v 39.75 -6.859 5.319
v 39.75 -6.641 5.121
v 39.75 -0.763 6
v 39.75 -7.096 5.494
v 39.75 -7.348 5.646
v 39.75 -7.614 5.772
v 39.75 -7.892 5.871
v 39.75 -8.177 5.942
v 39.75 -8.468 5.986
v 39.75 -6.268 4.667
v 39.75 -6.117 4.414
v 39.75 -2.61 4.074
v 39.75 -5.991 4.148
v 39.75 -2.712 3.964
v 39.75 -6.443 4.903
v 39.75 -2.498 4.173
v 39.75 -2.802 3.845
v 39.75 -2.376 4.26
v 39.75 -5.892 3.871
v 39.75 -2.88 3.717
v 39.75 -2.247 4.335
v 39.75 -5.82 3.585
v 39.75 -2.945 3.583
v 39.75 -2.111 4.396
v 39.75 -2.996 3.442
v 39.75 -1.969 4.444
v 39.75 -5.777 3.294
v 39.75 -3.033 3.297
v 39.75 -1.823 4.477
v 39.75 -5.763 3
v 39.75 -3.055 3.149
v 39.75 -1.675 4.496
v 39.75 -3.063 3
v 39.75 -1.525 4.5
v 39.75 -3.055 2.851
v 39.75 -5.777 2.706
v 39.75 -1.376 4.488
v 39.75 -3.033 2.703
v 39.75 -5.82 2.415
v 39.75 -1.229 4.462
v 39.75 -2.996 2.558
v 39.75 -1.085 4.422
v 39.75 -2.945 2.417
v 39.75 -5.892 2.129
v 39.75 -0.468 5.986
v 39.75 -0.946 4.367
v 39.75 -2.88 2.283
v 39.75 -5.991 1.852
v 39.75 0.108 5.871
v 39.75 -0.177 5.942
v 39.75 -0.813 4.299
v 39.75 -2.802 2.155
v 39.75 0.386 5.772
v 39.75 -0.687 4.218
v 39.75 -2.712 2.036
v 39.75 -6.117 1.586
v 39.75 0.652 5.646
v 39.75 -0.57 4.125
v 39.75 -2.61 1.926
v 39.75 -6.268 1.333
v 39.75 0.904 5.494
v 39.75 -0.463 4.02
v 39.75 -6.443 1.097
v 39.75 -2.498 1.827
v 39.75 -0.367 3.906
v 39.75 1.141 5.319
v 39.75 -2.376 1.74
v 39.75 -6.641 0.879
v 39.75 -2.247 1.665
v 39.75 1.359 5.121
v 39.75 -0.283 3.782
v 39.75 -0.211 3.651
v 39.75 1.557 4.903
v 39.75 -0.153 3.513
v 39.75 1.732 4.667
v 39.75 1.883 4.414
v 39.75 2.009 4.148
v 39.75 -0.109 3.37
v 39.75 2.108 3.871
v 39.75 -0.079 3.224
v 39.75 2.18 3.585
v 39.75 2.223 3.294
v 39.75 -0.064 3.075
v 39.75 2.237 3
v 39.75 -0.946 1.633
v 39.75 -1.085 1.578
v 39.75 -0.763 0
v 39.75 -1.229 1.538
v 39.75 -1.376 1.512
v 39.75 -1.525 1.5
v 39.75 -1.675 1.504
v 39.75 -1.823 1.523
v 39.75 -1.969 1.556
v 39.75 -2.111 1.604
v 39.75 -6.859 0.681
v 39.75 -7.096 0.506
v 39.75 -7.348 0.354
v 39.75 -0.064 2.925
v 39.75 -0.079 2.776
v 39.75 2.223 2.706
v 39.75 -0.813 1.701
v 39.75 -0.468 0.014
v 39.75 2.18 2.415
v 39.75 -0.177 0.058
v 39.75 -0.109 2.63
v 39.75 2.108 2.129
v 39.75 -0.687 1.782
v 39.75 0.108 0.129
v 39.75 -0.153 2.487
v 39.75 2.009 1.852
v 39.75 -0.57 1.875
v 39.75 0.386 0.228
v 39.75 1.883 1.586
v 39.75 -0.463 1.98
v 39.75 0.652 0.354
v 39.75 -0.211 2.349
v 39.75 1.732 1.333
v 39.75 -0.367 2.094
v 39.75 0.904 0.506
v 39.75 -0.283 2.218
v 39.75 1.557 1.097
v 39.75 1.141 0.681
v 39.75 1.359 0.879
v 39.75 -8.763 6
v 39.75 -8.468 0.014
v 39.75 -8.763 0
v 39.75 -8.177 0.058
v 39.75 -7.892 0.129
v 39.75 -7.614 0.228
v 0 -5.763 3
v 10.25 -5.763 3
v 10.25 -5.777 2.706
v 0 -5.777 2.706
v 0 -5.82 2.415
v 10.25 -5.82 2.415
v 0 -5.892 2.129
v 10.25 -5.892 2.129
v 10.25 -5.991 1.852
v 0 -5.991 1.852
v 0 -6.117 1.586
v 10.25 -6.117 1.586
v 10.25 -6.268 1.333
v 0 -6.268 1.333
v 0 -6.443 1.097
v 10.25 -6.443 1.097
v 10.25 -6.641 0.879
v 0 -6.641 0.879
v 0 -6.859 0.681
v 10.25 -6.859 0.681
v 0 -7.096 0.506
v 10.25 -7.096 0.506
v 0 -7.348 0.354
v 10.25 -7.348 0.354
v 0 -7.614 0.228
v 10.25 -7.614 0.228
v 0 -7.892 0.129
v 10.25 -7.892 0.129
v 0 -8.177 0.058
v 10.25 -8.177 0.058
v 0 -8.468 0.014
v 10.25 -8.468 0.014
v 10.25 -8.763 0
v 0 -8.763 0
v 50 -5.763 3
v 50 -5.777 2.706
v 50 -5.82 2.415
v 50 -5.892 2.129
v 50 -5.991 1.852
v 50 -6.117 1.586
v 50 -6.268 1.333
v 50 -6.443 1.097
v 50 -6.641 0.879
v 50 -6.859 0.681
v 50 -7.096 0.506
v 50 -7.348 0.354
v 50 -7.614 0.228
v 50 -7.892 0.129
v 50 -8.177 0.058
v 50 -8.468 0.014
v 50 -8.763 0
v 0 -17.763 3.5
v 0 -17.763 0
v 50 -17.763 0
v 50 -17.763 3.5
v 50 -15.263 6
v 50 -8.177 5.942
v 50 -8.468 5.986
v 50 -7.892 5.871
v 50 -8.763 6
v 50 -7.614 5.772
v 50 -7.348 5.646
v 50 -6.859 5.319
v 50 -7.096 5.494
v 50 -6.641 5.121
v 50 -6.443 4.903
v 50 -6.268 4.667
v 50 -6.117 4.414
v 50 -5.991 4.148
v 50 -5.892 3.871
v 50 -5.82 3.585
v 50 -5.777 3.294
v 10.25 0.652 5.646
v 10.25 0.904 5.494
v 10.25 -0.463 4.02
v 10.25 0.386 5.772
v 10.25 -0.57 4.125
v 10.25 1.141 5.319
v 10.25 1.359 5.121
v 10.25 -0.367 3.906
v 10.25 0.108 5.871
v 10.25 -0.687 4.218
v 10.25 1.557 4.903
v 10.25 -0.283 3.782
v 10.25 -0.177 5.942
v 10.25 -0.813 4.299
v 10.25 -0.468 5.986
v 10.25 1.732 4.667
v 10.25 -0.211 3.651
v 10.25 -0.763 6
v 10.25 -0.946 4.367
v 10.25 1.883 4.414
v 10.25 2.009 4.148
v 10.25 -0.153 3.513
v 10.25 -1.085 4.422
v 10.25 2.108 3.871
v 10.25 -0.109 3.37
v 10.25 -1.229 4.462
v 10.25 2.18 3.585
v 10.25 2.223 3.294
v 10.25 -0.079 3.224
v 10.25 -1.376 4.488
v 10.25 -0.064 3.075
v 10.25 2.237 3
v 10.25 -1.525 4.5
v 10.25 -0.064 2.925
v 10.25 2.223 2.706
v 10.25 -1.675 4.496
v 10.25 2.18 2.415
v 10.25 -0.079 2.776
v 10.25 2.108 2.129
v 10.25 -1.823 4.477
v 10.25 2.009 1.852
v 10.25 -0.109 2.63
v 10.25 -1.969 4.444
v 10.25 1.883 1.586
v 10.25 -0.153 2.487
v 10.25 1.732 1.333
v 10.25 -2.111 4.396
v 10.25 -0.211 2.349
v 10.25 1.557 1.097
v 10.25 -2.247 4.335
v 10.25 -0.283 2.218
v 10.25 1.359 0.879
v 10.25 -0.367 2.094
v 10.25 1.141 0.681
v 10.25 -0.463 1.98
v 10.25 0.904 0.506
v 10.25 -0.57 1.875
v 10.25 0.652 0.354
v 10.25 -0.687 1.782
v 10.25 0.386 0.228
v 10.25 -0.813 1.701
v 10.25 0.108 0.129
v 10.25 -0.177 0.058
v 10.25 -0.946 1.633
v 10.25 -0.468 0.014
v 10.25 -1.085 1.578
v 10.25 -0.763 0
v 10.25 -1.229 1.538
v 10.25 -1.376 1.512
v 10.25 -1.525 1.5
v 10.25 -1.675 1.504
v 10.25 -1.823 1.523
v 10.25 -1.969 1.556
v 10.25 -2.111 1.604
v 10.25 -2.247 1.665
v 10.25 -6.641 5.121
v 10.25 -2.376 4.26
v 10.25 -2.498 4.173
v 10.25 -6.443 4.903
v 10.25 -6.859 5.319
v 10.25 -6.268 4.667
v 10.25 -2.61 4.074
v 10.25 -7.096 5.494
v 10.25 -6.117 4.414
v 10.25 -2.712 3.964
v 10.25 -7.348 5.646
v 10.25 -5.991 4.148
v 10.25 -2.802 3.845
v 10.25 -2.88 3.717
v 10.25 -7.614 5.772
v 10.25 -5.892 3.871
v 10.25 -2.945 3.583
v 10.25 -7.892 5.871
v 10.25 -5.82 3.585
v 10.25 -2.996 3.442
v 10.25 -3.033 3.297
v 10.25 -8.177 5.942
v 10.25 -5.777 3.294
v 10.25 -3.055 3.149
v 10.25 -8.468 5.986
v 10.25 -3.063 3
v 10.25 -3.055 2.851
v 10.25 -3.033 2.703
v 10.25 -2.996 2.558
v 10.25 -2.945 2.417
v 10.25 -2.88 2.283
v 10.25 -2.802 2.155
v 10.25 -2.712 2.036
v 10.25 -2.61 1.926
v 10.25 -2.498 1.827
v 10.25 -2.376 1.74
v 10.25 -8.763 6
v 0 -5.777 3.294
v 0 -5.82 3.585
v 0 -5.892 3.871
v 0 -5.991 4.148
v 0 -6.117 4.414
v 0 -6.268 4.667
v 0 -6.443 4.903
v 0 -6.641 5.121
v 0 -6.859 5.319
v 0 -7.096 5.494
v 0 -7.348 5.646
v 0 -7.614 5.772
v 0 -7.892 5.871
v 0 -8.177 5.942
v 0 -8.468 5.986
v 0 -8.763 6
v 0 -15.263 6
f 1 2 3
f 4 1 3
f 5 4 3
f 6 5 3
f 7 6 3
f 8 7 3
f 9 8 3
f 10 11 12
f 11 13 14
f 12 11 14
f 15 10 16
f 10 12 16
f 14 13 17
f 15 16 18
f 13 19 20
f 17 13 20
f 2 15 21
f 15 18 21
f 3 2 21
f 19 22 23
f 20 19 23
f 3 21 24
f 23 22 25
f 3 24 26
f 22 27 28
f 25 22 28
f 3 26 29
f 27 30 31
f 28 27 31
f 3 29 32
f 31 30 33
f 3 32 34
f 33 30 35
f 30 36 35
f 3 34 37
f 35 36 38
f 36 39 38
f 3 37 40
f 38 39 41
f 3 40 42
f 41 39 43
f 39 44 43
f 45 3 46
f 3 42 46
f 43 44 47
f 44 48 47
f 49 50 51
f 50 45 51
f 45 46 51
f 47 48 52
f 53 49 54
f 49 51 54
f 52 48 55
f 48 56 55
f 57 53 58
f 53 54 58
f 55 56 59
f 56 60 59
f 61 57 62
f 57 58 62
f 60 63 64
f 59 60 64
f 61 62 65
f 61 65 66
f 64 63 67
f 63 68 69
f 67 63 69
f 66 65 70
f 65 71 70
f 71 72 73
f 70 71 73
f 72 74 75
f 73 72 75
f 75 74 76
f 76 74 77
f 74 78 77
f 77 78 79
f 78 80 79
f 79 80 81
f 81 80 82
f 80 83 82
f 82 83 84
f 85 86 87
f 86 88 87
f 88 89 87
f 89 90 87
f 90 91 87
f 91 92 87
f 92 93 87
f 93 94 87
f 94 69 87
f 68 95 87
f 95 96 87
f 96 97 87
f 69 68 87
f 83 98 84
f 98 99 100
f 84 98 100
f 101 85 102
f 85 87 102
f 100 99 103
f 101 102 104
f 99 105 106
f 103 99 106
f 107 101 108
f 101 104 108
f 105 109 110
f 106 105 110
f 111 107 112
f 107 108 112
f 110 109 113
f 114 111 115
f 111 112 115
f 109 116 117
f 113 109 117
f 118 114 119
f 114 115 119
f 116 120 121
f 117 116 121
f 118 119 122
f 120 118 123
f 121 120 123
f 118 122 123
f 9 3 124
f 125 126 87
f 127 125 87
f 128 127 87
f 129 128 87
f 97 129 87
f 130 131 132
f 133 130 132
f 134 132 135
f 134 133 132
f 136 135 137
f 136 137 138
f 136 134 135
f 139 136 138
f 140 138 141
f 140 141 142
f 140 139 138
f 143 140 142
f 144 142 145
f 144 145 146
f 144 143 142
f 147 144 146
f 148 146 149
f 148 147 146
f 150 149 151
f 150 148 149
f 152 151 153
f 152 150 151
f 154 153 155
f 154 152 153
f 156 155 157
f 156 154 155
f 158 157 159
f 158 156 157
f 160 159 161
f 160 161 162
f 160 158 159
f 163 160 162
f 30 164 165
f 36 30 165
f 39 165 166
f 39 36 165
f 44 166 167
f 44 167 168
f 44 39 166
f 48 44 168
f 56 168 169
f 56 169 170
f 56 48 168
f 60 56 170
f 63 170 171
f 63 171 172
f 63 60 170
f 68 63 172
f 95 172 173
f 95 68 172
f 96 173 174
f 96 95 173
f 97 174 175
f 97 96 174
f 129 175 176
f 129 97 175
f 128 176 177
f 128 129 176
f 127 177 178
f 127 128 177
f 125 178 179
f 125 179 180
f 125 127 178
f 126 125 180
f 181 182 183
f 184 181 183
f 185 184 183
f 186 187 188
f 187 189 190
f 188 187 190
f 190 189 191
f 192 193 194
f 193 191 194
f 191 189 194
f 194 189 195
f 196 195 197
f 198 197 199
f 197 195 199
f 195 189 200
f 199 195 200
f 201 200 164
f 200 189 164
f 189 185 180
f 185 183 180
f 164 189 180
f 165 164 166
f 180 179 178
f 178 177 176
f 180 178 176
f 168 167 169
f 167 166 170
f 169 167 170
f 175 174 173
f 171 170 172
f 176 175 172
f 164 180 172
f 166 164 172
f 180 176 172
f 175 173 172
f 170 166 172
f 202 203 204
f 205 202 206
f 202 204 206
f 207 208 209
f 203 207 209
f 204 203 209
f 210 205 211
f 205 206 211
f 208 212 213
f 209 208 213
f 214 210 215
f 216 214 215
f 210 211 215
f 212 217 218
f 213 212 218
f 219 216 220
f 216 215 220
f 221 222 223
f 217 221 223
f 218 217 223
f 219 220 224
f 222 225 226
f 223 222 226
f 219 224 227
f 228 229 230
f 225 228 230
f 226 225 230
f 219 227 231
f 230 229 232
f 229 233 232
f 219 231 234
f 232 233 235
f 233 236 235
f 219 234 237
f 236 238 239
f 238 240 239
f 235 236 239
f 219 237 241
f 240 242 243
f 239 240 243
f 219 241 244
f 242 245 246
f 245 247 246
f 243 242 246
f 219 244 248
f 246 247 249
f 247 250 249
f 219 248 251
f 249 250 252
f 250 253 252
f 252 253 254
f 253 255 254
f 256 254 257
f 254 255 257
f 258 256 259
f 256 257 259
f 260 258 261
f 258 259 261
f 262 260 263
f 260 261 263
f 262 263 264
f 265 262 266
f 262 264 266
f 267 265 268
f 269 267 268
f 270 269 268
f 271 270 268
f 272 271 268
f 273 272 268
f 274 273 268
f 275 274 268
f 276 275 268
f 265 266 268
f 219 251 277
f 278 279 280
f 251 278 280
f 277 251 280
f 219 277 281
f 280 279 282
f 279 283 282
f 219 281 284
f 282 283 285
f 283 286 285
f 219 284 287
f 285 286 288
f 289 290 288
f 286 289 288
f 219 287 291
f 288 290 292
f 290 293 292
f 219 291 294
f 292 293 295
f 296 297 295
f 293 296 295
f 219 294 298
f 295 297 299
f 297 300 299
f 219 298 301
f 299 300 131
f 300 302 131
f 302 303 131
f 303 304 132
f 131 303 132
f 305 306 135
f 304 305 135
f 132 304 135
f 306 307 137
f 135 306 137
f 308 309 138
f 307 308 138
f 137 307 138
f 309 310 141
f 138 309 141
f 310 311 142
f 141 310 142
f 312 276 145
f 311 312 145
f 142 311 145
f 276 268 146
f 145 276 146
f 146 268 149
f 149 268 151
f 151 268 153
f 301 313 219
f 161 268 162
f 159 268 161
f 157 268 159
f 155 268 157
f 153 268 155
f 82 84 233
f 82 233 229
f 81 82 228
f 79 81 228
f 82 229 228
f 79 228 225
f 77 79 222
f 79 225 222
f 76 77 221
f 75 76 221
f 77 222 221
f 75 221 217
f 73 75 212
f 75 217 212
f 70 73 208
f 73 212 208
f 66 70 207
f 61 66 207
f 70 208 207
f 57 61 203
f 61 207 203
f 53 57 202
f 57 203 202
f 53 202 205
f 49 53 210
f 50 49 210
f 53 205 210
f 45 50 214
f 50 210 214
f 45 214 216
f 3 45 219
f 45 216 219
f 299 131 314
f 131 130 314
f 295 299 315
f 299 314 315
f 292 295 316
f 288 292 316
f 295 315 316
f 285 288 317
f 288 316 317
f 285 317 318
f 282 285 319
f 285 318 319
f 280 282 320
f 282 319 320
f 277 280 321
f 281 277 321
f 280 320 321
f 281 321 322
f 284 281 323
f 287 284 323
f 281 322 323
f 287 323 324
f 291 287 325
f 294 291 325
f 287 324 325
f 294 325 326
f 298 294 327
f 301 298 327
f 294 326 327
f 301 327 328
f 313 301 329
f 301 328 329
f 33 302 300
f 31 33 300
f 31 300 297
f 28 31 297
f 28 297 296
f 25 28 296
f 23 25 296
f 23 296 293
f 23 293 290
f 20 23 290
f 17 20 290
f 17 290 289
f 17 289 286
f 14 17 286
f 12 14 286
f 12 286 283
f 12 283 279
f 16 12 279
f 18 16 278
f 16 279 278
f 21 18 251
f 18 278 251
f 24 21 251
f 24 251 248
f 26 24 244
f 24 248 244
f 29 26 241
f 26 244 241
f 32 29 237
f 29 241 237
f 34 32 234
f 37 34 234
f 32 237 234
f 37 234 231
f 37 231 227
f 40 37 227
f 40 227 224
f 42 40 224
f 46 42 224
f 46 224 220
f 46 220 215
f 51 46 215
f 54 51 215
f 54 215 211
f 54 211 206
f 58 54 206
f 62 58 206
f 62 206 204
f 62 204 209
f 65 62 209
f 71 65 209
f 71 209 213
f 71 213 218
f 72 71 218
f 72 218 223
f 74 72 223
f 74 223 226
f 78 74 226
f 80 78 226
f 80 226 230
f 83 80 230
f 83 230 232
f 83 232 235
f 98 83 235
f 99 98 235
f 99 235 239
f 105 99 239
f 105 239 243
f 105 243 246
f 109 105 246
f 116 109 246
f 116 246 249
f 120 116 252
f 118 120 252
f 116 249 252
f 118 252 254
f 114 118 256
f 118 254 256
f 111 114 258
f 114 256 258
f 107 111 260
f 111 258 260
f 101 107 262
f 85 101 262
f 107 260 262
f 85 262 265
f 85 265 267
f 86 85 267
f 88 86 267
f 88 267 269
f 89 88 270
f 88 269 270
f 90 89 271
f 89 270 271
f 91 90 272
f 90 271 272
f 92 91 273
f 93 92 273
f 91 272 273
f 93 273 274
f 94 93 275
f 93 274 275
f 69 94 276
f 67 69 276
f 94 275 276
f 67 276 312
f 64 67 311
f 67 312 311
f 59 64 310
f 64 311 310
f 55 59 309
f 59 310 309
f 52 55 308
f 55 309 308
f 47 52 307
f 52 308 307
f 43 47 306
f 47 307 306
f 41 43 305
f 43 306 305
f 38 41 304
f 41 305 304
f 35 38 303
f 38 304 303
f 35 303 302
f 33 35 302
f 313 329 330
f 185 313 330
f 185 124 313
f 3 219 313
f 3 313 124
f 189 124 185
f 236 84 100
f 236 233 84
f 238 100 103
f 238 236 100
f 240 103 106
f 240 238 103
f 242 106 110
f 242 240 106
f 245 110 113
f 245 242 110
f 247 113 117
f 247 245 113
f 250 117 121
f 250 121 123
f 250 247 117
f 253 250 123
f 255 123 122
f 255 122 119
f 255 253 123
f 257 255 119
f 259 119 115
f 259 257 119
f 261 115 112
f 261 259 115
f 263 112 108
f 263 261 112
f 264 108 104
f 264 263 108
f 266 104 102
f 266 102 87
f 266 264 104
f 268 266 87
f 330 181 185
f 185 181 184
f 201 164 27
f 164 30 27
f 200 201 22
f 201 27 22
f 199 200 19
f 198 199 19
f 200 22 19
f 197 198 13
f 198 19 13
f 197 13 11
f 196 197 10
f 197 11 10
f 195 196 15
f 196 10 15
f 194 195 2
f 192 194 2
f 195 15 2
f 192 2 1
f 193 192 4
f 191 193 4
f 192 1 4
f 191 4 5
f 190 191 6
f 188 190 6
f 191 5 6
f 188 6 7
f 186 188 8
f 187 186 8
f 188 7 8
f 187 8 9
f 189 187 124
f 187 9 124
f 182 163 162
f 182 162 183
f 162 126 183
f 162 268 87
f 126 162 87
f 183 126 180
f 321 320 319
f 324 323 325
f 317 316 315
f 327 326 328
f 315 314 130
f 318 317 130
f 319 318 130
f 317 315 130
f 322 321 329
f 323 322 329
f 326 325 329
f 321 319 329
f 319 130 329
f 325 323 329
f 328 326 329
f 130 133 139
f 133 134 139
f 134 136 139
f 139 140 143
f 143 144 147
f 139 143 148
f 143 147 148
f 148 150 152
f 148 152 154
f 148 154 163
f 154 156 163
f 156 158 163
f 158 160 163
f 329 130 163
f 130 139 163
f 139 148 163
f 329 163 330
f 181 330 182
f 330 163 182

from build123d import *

# Parameters (mm, degrees)
F1_DEPTH = 6
F2_R     = 2.99999
F3_R     = 1.5
F4_DEPTH = 39.751
F5_SIZE  = 2.5


# Not quite as in the source:
# - a fillet or chamfer is up to 0.001 mm smaller than in the source, because OpenCascade refuses the exact size


with BuildPart() as f1:
    # F0 (on Top) → F1 (new body)
    with BuildSketch(Plane.XY):
        Polygon((0, -5.7625164015), (0, -17.7625164015), (50, -17.7625164015), (50, -5.7625164015), (39.75, -5.7625164015), (39.75, 2.2374835985), (10.25, 2.2374835985), (10.25, -5.7625164015), align=None)
    extrude(amount=F1_DEPTH)

    # F2 (radius 3 in the source; OpenCascade refuses exactly that, so slightly less here)
    f2_edges = [f1.edges().sort_by_distance(p)[0] for p in [
        (25, 2.237484, 6),
        (25, 2.237484, 0),
        (5.125, -5.762516, 6),
        (44.875, -5.762516, 6),
        (5.125, -5.762516, 0),
        (44.875, -5.762516, 0),
    ]]
    fillet(f2_edges, radius=F2_R)

    # F3 (on face) → F4 (cut, through all)
    with BuildSketch(Plane(origin=(10.25, 0, 0), x_dir=(0, -1, 0), z_dir=(-1, 0, 0))):
        with Locations((1.5625164015, 3)):
            Circle(F3_R)
    extrude(amount=-F4_DEPTH, mode=Mode.SUBTRACT)

    # F5
    f5_edges = [f1.edges().sort_by_distance(p)[0] for p in [
        (25, -17.762516, 6),
    ]]
    chamfer(f5_edges, length=F5_SIZE)


solid = f1.part
